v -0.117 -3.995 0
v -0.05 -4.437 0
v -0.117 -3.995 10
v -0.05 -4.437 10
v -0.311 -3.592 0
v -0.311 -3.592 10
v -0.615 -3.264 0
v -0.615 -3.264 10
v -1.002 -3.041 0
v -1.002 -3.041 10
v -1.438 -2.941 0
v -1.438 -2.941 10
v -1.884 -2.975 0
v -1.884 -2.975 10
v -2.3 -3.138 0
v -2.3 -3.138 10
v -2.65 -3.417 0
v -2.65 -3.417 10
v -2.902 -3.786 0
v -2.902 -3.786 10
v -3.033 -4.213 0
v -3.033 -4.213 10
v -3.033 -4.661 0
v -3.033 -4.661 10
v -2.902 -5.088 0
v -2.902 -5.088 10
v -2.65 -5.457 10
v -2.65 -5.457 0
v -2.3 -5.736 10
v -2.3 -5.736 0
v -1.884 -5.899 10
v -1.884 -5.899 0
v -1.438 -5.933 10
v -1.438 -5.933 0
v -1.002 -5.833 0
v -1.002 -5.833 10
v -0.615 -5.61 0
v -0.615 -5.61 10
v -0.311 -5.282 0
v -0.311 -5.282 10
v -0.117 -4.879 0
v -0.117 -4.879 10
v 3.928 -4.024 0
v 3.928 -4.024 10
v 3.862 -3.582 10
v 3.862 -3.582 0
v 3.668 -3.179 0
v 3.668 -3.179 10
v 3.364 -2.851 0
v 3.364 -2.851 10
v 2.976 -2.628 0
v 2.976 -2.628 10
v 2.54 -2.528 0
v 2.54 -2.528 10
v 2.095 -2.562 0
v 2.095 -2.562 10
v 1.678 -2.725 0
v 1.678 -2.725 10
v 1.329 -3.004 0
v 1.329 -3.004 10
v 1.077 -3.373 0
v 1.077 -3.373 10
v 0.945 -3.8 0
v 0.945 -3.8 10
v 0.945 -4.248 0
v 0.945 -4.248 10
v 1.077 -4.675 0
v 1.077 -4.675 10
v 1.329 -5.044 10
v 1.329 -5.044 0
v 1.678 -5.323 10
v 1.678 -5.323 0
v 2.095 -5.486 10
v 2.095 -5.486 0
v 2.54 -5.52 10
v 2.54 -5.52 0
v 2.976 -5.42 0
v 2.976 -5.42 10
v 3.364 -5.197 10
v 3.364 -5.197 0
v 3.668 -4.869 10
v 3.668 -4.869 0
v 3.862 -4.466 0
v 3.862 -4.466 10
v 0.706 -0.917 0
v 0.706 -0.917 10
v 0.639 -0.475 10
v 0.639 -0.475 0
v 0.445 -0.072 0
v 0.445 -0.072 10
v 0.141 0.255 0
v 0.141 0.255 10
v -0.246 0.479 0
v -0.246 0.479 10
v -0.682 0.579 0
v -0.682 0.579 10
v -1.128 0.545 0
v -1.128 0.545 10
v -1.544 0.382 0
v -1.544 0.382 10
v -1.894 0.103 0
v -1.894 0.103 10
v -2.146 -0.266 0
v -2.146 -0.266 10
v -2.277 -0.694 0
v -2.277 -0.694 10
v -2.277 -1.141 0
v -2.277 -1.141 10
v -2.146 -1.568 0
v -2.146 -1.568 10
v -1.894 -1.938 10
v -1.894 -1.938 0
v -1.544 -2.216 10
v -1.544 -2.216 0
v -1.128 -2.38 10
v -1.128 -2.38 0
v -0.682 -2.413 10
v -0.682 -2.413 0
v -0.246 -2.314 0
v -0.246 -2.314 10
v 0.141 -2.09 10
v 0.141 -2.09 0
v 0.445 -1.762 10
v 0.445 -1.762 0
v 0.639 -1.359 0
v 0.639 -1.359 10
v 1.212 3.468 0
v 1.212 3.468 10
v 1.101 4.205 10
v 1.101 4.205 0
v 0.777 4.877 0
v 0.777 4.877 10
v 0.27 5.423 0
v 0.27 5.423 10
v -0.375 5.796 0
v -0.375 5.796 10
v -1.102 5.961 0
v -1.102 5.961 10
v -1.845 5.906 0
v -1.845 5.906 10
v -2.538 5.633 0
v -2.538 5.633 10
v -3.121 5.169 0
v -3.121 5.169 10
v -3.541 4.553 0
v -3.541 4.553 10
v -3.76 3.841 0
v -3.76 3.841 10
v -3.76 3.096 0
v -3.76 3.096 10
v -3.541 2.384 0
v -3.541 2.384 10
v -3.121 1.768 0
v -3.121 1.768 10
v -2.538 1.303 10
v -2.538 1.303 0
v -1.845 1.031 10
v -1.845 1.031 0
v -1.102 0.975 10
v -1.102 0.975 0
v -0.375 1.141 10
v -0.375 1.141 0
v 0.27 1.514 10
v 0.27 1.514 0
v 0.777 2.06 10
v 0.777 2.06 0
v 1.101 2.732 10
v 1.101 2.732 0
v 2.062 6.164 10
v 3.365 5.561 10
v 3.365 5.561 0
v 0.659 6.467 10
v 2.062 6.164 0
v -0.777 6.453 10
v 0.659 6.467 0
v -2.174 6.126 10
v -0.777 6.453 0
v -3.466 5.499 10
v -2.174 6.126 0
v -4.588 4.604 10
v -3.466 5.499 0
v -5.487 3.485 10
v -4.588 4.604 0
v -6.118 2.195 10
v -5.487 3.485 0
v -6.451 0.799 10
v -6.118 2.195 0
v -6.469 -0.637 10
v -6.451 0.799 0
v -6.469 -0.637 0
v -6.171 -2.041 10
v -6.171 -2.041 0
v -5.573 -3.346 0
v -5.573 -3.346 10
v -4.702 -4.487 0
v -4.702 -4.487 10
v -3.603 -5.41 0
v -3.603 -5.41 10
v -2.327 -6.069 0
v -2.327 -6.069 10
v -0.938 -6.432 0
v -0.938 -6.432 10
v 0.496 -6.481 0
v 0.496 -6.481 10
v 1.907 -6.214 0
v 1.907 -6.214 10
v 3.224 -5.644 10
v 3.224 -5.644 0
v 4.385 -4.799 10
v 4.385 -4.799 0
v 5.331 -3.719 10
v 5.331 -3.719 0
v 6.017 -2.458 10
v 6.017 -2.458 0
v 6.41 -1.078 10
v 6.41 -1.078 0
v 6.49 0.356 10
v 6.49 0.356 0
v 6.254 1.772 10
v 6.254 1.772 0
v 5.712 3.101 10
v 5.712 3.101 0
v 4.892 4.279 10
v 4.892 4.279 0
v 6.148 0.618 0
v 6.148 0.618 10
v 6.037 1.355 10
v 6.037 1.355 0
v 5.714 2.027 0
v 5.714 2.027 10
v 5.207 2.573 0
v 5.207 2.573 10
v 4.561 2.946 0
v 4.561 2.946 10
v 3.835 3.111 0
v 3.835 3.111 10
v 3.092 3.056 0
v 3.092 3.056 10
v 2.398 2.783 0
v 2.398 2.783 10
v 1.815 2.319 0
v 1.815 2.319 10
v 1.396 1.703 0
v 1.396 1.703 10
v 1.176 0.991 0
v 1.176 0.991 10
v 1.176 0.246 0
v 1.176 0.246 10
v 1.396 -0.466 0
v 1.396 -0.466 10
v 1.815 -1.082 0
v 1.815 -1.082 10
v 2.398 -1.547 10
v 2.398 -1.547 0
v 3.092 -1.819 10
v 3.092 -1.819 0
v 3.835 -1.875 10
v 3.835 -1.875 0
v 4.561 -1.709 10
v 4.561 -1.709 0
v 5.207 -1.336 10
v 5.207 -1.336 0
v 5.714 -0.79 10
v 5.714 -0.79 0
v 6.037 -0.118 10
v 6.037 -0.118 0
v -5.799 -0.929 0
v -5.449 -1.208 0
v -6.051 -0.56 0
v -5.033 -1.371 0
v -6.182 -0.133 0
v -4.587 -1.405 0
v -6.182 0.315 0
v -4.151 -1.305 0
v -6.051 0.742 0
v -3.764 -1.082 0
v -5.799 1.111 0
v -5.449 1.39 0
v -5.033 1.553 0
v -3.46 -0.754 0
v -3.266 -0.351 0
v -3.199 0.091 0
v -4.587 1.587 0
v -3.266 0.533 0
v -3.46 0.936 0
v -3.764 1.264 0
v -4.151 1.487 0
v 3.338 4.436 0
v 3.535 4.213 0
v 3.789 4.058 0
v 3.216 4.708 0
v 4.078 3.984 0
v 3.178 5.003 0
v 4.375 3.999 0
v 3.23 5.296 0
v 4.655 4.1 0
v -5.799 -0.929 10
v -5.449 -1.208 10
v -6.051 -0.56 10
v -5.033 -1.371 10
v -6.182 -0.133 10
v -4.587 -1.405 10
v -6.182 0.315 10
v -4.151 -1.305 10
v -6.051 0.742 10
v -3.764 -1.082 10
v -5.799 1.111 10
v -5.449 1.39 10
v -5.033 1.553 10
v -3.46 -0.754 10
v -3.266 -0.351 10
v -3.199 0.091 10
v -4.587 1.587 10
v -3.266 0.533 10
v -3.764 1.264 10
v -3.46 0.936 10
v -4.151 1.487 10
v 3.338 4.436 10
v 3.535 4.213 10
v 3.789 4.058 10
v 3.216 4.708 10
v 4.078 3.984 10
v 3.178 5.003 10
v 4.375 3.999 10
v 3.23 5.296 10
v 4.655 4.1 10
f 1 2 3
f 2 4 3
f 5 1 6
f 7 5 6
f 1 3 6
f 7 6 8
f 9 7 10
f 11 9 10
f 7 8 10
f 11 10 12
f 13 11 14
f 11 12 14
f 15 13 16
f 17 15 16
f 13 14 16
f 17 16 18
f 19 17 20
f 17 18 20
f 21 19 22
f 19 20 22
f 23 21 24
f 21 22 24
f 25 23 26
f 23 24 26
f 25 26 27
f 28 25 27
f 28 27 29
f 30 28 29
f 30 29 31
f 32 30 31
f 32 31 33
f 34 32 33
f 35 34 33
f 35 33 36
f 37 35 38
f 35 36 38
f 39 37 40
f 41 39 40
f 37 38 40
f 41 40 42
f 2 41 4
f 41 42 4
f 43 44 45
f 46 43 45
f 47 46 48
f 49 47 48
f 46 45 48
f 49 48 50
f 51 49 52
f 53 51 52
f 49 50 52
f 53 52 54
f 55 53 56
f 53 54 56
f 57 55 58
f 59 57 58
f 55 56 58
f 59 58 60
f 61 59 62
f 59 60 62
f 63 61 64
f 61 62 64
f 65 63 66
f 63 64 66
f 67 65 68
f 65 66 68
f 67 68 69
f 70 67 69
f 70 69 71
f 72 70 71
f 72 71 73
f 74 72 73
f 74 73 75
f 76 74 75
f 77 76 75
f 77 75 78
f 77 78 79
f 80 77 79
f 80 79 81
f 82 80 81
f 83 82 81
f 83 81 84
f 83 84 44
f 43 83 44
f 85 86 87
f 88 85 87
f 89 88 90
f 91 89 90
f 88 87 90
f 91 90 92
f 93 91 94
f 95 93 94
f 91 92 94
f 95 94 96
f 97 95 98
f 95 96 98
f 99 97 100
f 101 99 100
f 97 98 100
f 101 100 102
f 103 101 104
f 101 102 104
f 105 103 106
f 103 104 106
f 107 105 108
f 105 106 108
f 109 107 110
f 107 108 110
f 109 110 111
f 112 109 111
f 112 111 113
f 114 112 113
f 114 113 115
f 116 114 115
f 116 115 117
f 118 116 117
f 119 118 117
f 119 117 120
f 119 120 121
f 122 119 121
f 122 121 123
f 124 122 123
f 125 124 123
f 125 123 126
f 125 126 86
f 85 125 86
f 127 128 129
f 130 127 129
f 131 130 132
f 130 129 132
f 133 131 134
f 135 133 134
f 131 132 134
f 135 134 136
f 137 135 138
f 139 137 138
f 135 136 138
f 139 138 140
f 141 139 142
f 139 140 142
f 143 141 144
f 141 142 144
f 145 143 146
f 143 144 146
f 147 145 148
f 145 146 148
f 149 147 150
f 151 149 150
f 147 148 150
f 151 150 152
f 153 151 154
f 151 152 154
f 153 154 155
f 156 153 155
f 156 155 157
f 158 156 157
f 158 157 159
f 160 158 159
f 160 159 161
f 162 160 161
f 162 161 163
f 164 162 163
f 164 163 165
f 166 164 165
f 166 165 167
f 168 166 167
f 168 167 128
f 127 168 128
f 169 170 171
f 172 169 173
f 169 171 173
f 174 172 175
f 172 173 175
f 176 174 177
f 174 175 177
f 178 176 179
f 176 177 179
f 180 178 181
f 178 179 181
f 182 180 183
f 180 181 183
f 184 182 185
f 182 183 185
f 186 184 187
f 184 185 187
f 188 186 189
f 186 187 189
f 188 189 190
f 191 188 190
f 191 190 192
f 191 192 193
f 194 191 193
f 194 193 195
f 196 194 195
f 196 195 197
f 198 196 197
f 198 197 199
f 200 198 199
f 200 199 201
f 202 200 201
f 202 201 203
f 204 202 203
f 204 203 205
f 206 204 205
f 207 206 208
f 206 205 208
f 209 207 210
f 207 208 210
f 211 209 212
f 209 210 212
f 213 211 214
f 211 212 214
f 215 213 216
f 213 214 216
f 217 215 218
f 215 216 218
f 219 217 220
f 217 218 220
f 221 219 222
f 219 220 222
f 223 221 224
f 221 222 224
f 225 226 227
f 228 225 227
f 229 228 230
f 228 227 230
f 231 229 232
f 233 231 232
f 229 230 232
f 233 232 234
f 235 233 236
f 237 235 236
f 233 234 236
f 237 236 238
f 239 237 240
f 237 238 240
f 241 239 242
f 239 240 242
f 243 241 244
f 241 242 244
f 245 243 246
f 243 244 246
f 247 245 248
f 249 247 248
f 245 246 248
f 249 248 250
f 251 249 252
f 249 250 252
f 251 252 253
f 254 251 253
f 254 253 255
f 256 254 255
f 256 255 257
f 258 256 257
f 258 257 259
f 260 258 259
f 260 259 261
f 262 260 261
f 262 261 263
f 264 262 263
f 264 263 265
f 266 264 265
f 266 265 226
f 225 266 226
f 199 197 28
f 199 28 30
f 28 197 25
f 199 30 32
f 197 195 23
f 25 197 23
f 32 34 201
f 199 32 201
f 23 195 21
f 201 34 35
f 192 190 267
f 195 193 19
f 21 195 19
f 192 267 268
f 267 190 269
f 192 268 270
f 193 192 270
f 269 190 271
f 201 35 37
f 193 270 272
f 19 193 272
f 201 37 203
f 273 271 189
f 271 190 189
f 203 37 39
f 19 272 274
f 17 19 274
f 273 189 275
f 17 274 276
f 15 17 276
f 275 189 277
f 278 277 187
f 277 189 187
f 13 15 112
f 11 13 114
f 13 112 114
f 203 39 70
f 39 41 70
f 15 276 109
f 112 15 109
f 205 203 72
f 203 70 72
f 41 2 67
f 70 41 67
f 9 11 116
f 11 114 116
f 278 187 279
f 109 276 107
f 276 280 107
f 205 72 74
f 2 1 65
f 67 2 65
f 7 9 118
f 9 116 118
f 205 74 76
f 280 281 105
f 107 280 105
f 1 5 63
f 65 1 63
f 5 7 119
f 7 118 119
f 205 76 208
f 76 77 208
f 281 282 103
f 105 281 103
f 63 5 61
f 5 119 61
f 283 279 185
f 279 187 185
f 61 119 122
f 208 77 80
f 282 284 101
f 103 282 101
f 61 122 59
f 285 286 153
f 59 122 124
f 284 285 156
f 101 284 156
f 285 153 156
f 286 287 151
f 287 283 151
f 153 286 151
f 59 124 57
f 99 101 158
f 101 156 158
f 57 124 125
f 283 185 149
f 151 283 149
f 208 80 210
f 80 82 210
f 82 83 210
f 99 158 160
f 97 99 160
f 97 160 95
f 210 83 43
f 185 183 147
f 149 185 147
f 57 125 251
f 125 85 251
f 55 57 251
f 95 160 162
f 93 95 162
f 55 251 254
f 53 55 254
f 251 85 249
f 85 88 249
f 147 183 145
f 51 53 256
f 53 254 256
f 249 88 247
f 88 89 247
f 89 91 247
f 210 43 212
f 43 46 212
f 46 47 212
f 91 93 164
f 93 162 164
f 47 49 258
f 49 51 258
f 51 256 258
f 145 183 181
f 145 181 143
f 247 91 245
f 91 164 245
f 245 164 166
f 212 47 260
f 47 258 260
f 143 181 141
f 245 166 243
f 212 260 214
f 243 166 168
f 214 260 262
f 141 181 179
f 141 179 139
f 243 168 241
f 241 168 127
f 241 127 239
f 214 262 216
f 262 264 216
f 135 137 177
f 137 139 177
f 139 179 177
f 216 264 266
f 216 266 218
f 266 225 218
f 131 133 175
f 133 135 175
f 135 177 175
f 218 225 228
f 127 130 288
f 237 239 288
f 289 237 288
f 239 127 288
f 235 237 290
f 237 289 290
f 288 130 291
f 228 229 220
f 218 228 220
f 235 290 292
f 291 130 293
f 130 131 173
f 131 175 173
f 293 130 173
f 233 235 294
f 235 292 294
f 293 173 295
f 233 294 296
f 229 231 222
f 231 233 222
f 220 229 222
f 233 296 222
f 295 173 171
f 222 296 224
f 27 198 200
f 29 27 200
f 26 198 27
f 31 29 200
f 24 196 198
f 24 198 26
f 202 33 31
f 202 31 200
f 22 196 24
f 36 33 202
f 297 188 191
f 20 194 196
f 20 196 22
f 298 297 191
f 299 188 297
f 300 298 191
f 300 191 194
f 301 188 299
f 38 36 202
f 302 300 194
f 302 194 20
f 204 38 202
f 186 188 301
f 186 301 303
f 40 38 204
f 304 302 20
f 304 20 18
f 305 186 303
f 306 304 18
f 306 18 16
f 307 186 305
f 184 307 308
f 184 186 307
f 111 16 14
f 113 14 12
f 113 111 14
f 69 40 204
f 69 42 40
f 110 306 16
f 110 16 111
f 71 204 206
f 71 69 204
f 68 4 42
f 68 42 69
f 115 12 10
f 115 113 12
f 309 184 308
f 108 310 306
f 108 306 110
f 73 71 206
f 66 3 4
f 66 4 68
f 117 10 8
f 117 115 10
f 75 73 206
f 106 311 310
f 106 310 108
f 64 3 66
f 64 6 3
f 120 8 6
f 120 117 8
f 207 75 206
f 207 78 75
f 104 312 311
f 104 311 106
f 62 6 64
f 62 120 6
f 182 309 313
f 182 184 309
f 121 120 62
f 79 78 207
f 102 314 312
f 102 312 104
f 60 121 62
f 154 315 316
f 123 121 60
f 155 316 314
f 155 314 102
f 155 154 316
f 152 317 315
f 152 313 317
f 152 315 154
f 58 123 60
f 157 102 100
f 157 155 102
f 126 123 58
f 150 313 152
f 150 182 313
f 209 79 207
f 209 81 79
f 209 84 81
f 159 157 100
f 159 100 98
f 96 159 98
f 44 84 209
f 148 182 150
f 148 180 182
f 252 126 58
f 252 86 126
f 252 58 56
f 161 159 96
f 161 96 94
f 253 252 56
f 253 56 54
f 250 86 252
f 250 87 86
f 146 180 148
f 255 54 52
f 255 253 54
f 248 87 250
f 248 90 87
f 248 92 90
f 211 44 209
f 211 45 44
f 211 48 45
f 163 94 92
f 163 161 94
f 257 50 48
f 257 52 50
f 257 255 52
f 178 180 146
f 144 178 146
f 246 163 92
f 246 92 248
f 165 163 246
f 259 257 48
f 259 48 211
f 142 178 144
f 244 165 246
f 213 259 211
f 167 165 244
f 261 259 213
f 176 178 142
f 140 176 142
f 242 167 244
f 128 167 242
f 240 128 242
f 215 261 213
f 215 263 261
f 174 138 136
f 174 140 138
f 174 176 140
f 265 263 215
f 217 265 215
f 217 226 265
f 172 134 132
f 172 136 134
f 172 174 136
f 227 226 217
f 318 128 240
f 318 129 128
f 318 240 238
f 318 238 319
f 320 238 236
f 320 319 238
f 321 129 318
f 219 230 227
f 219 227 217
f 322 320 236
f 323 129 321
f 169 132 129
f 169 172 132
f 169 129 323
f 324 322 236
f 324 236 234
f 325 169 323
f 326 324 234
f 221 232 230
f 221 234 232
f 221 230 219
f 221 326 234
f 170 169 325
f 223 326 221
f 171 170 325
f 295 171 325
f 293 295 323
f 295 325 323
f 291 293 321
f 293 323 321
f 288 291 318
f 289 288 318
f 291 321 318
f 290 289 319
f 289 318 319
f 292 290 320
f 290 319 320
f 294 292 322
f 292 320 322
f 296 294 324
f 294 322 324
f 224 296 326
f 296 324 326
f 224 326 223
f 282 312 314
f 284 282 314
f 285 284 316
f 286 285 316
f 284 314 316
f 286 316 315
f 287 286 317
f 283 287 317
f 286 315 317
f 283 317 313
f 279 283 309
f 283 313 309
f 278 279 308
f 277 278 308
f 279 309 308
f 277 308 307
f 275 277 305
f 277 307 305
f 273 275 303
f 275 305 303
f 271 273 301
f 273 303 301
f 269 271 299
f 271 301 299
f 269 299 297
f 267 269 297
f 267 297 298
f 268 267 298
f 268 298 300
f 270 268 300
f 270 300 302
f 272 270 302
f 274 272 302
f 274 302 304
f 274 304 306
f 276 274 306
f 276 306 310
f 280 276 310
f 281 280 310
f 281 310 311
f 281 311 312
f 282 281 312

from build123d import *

# Parameters (mm, degrees)
F0_R     = 6.5
F1_DEPTH = 10
F3_R     = 2.5
F3_R_2   = 1.5
F3_R_3   = 1
F4_DEPTH = 25
F5_DEPTH = 15


with BuildPart() as f1:
    # F0 (on Top) → F1 (new body)
    with BuildSketch(Plane.XY):
        Circle(F0_R)
    extrude(amount=F1_DEPTH)

    # F3 (on offset) → F4 (cut, symmetric)
    with BuildSketch(Plane.XY.offset(10)):
        with Locations((-1.288395, 3.468435)):
            Circle(F3_R)
        with Locations((-4.699119, 0.091015)):
            Circle(F3_R_2)
        with Locations((-0.794072, -0.917286)):
            Circle(F3_R_2)
        with Locations((4.178119, 4.979289)):
            Circle(F3_R_3)
        with Locations((3.64795, 0.618435)):
            Circle(F3_R)
        with Locations((2.428381, -4.024049)):
            Circle(F3_R_2)
        with Locations((-1.550249, -4.436973)):
            Circle(F3_R_2)
    extrude(amount=F4_DEPTH, both=True, mode=Mode.SUBTRACT)

    # F3 (on offset) → F5 (cut, symmetric)
    with BuildSketch(Plane.XY.offset(10)):
        with Locations((4.178119, 4.979289)):
            Circle(F3_R_3)
    extrude(amount=F5_DEPTH, both=True, mode=Mode.SUBTRACT)


solid = f1.part
